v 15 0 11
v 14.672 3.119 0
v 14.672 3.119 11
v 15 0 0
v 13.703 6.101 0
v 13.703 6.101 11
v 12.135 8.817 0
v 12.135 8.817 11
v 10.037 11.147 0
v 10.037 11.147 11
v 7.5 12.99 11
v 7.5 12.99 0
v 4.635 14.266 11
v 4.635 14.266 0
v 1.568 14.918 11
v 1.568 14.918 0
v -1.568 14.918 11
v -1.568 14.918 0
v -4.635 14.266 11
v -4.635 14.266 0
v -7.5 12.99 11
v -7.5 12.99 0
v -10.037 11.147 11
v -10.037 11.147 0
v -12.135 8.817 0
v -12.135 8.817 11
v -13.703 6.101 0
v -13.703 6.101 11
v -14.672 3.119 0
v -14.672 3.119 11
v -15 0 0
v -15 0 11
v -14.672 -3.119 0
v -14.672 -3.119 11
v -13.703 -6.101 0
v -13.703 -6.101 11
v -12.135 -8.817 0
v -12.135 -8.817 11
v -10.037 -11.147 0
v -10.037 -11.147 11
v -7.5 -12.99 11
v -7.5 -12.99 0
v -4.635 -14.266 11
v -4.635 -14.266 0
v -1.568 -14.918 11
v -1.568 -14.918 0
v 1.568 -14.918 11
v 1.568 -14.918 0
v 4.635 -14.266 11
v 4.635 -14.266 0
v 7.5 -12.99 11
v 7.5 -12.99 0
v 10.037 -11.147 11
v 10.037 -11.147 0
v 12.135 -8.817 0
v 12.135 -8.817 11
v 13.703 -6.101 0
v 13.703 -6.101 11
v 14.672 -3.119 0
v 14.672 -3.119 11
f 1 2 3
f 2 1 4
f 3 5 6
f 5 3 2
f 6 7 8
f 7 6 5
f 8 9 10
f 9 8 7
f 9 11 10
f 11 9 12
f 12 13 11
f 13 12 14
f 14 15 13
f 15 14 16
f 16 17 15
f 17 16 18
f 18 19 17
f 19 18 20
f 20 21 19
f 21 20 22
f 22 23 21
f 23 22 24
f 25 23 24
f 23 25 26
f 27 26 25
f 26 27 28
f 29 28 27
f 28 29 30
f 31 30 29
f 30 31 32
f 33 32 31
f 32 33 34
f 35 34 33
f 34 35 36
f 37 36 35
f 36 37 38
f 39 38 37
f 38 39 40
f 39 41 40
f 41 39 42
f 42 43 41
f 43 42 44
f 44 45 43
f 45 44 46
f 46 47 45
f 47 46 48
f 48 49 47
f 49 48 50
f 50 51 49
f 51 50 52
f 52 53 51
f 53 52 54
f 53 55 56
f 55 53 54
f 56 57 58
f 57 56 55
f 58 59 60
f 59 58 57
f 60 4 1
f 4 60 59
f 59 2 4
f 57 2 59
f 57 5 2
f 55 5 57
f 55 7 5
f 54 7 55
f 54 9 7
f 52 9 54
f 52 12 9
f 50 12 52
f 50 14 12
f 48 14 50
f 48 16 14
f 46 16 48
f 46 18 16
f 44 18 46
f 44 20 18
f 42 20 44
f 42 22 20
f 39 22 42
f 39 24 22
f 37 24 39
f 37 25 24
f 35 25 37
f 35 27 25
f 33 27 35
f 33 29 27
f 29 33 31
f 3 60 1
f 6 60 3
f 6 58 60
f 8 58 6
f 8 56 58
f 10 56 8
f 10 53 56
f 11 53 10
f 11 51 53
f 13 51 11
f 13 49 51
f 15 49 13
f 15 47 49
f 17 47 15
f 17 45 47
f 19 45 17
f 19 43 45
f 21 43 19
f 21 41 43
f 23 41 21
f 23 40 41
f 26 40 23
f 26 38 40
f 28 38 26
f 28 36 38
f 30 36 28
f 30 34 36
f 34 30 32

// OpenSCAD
// Generated by SolidPython 1.0.1 on 2020-07-29 00:39:25


cylinder(h = 11, r1 = 15, r2 = 15);
/***********************************************
*********      SolidPython code:      **********
************************************************
 
# import packages: SolidPython
from solid import *
from solid.utils import *
from itertools import chain, combinations


class Resize:

    def __init__(self, scad_file):
        self.scad_file = scad_file
        #self.scad_file = import_scad(scad_file)
        # cone/cylinder param:
        self.r1 = 0
        self.r2 = 0
        self.h = 0
        # rectangular prism param:
        self.w = 0
        self.l = 0
        # ellipse param:
        self.r = 0

    # import OpenScad code (file name corresponds to shape)


    # classify shape + parameters
    def assign(self, param1, param2, param3):
        if self.scad_file == 'cone.scad':
            self.r1 = param1
            self.r2 = param2
            self.h = param3
        elif self.scad_file == 'cylinder.scad':
            self.r1 = param1
            self.r2 = param2
            self.h = param3
        elif self.scad_file == 'rectangularPrism.scad':
            self.h = param1
            self.l = param2
            self.w = param3
        else:
            self.r = param1
            self.h = param2

    # resize parameters
    def iterate(self):
        x = range(3, 20, 2)
        i = 1
        if self.scad_file == 'cone.scad':
            tempList = list(combinations(x, 2))
            for temp in tempList:
                param1 = temp[0]
                param2 = temp[1]
                filepath = 'produced_scad_files/' + 'cone' + str(param1) + '_' + str(param2) + '_' + '.scad'
                scad_render_to_file(cylinder(h=param1, r1=param2, r2=0), filepath)

        elif self.scad_file == 'cylinder.scad':
            tempList = list(combinations(x, 3))
            for temp in tempList:
                param1 = temp[0]
                param2 = temp[1]
                filepath = 'produced_scad_files/' + 'cylinder' + str(param1) + '_' + str(param2) + '_' + '.scad'
                scad_render_to_file(cylinder(h=param1, r1=param2, r2=param2), filepath)

        elif self.scad_file == 'rectangularPrism.scad':
            tempList = list(combinations(x, 3))
            for temp in tempList:
                param1 = temp[0]
                param2 = temp[1]
                param3 = temp[2]
                filepath = 'produced_scad_files/' + 'rectangularPrism' + str(param1) + '_' + str(param2) + '_' + str(
                    param3) + '.scad'
                scad_render_to_file(cube(size=(param1, param2, param3)), filepath)

        elif self.scad_file == 'ellipse.scad':
            tempList = list(combinations(x, 4))
            for temp in tempList:
                param1 = temp[0]
                param2 = temp[1]
                param3 = temp[2]
                param4 = temp[3]
                filepath = 'produced_scad_files/' + 'ellipse' + str(param1) + '_' + str(param2) + '_' + str(param3) + '_' + str(param4) + '.scad'
                scad_render_to_file(scale([param1, param2, param3])(sphere(r=param4)), filepath)

    def render_to_scadfile(self):
        scad_render_to_file(scad, 'example.scad') 
 
************************************************/
